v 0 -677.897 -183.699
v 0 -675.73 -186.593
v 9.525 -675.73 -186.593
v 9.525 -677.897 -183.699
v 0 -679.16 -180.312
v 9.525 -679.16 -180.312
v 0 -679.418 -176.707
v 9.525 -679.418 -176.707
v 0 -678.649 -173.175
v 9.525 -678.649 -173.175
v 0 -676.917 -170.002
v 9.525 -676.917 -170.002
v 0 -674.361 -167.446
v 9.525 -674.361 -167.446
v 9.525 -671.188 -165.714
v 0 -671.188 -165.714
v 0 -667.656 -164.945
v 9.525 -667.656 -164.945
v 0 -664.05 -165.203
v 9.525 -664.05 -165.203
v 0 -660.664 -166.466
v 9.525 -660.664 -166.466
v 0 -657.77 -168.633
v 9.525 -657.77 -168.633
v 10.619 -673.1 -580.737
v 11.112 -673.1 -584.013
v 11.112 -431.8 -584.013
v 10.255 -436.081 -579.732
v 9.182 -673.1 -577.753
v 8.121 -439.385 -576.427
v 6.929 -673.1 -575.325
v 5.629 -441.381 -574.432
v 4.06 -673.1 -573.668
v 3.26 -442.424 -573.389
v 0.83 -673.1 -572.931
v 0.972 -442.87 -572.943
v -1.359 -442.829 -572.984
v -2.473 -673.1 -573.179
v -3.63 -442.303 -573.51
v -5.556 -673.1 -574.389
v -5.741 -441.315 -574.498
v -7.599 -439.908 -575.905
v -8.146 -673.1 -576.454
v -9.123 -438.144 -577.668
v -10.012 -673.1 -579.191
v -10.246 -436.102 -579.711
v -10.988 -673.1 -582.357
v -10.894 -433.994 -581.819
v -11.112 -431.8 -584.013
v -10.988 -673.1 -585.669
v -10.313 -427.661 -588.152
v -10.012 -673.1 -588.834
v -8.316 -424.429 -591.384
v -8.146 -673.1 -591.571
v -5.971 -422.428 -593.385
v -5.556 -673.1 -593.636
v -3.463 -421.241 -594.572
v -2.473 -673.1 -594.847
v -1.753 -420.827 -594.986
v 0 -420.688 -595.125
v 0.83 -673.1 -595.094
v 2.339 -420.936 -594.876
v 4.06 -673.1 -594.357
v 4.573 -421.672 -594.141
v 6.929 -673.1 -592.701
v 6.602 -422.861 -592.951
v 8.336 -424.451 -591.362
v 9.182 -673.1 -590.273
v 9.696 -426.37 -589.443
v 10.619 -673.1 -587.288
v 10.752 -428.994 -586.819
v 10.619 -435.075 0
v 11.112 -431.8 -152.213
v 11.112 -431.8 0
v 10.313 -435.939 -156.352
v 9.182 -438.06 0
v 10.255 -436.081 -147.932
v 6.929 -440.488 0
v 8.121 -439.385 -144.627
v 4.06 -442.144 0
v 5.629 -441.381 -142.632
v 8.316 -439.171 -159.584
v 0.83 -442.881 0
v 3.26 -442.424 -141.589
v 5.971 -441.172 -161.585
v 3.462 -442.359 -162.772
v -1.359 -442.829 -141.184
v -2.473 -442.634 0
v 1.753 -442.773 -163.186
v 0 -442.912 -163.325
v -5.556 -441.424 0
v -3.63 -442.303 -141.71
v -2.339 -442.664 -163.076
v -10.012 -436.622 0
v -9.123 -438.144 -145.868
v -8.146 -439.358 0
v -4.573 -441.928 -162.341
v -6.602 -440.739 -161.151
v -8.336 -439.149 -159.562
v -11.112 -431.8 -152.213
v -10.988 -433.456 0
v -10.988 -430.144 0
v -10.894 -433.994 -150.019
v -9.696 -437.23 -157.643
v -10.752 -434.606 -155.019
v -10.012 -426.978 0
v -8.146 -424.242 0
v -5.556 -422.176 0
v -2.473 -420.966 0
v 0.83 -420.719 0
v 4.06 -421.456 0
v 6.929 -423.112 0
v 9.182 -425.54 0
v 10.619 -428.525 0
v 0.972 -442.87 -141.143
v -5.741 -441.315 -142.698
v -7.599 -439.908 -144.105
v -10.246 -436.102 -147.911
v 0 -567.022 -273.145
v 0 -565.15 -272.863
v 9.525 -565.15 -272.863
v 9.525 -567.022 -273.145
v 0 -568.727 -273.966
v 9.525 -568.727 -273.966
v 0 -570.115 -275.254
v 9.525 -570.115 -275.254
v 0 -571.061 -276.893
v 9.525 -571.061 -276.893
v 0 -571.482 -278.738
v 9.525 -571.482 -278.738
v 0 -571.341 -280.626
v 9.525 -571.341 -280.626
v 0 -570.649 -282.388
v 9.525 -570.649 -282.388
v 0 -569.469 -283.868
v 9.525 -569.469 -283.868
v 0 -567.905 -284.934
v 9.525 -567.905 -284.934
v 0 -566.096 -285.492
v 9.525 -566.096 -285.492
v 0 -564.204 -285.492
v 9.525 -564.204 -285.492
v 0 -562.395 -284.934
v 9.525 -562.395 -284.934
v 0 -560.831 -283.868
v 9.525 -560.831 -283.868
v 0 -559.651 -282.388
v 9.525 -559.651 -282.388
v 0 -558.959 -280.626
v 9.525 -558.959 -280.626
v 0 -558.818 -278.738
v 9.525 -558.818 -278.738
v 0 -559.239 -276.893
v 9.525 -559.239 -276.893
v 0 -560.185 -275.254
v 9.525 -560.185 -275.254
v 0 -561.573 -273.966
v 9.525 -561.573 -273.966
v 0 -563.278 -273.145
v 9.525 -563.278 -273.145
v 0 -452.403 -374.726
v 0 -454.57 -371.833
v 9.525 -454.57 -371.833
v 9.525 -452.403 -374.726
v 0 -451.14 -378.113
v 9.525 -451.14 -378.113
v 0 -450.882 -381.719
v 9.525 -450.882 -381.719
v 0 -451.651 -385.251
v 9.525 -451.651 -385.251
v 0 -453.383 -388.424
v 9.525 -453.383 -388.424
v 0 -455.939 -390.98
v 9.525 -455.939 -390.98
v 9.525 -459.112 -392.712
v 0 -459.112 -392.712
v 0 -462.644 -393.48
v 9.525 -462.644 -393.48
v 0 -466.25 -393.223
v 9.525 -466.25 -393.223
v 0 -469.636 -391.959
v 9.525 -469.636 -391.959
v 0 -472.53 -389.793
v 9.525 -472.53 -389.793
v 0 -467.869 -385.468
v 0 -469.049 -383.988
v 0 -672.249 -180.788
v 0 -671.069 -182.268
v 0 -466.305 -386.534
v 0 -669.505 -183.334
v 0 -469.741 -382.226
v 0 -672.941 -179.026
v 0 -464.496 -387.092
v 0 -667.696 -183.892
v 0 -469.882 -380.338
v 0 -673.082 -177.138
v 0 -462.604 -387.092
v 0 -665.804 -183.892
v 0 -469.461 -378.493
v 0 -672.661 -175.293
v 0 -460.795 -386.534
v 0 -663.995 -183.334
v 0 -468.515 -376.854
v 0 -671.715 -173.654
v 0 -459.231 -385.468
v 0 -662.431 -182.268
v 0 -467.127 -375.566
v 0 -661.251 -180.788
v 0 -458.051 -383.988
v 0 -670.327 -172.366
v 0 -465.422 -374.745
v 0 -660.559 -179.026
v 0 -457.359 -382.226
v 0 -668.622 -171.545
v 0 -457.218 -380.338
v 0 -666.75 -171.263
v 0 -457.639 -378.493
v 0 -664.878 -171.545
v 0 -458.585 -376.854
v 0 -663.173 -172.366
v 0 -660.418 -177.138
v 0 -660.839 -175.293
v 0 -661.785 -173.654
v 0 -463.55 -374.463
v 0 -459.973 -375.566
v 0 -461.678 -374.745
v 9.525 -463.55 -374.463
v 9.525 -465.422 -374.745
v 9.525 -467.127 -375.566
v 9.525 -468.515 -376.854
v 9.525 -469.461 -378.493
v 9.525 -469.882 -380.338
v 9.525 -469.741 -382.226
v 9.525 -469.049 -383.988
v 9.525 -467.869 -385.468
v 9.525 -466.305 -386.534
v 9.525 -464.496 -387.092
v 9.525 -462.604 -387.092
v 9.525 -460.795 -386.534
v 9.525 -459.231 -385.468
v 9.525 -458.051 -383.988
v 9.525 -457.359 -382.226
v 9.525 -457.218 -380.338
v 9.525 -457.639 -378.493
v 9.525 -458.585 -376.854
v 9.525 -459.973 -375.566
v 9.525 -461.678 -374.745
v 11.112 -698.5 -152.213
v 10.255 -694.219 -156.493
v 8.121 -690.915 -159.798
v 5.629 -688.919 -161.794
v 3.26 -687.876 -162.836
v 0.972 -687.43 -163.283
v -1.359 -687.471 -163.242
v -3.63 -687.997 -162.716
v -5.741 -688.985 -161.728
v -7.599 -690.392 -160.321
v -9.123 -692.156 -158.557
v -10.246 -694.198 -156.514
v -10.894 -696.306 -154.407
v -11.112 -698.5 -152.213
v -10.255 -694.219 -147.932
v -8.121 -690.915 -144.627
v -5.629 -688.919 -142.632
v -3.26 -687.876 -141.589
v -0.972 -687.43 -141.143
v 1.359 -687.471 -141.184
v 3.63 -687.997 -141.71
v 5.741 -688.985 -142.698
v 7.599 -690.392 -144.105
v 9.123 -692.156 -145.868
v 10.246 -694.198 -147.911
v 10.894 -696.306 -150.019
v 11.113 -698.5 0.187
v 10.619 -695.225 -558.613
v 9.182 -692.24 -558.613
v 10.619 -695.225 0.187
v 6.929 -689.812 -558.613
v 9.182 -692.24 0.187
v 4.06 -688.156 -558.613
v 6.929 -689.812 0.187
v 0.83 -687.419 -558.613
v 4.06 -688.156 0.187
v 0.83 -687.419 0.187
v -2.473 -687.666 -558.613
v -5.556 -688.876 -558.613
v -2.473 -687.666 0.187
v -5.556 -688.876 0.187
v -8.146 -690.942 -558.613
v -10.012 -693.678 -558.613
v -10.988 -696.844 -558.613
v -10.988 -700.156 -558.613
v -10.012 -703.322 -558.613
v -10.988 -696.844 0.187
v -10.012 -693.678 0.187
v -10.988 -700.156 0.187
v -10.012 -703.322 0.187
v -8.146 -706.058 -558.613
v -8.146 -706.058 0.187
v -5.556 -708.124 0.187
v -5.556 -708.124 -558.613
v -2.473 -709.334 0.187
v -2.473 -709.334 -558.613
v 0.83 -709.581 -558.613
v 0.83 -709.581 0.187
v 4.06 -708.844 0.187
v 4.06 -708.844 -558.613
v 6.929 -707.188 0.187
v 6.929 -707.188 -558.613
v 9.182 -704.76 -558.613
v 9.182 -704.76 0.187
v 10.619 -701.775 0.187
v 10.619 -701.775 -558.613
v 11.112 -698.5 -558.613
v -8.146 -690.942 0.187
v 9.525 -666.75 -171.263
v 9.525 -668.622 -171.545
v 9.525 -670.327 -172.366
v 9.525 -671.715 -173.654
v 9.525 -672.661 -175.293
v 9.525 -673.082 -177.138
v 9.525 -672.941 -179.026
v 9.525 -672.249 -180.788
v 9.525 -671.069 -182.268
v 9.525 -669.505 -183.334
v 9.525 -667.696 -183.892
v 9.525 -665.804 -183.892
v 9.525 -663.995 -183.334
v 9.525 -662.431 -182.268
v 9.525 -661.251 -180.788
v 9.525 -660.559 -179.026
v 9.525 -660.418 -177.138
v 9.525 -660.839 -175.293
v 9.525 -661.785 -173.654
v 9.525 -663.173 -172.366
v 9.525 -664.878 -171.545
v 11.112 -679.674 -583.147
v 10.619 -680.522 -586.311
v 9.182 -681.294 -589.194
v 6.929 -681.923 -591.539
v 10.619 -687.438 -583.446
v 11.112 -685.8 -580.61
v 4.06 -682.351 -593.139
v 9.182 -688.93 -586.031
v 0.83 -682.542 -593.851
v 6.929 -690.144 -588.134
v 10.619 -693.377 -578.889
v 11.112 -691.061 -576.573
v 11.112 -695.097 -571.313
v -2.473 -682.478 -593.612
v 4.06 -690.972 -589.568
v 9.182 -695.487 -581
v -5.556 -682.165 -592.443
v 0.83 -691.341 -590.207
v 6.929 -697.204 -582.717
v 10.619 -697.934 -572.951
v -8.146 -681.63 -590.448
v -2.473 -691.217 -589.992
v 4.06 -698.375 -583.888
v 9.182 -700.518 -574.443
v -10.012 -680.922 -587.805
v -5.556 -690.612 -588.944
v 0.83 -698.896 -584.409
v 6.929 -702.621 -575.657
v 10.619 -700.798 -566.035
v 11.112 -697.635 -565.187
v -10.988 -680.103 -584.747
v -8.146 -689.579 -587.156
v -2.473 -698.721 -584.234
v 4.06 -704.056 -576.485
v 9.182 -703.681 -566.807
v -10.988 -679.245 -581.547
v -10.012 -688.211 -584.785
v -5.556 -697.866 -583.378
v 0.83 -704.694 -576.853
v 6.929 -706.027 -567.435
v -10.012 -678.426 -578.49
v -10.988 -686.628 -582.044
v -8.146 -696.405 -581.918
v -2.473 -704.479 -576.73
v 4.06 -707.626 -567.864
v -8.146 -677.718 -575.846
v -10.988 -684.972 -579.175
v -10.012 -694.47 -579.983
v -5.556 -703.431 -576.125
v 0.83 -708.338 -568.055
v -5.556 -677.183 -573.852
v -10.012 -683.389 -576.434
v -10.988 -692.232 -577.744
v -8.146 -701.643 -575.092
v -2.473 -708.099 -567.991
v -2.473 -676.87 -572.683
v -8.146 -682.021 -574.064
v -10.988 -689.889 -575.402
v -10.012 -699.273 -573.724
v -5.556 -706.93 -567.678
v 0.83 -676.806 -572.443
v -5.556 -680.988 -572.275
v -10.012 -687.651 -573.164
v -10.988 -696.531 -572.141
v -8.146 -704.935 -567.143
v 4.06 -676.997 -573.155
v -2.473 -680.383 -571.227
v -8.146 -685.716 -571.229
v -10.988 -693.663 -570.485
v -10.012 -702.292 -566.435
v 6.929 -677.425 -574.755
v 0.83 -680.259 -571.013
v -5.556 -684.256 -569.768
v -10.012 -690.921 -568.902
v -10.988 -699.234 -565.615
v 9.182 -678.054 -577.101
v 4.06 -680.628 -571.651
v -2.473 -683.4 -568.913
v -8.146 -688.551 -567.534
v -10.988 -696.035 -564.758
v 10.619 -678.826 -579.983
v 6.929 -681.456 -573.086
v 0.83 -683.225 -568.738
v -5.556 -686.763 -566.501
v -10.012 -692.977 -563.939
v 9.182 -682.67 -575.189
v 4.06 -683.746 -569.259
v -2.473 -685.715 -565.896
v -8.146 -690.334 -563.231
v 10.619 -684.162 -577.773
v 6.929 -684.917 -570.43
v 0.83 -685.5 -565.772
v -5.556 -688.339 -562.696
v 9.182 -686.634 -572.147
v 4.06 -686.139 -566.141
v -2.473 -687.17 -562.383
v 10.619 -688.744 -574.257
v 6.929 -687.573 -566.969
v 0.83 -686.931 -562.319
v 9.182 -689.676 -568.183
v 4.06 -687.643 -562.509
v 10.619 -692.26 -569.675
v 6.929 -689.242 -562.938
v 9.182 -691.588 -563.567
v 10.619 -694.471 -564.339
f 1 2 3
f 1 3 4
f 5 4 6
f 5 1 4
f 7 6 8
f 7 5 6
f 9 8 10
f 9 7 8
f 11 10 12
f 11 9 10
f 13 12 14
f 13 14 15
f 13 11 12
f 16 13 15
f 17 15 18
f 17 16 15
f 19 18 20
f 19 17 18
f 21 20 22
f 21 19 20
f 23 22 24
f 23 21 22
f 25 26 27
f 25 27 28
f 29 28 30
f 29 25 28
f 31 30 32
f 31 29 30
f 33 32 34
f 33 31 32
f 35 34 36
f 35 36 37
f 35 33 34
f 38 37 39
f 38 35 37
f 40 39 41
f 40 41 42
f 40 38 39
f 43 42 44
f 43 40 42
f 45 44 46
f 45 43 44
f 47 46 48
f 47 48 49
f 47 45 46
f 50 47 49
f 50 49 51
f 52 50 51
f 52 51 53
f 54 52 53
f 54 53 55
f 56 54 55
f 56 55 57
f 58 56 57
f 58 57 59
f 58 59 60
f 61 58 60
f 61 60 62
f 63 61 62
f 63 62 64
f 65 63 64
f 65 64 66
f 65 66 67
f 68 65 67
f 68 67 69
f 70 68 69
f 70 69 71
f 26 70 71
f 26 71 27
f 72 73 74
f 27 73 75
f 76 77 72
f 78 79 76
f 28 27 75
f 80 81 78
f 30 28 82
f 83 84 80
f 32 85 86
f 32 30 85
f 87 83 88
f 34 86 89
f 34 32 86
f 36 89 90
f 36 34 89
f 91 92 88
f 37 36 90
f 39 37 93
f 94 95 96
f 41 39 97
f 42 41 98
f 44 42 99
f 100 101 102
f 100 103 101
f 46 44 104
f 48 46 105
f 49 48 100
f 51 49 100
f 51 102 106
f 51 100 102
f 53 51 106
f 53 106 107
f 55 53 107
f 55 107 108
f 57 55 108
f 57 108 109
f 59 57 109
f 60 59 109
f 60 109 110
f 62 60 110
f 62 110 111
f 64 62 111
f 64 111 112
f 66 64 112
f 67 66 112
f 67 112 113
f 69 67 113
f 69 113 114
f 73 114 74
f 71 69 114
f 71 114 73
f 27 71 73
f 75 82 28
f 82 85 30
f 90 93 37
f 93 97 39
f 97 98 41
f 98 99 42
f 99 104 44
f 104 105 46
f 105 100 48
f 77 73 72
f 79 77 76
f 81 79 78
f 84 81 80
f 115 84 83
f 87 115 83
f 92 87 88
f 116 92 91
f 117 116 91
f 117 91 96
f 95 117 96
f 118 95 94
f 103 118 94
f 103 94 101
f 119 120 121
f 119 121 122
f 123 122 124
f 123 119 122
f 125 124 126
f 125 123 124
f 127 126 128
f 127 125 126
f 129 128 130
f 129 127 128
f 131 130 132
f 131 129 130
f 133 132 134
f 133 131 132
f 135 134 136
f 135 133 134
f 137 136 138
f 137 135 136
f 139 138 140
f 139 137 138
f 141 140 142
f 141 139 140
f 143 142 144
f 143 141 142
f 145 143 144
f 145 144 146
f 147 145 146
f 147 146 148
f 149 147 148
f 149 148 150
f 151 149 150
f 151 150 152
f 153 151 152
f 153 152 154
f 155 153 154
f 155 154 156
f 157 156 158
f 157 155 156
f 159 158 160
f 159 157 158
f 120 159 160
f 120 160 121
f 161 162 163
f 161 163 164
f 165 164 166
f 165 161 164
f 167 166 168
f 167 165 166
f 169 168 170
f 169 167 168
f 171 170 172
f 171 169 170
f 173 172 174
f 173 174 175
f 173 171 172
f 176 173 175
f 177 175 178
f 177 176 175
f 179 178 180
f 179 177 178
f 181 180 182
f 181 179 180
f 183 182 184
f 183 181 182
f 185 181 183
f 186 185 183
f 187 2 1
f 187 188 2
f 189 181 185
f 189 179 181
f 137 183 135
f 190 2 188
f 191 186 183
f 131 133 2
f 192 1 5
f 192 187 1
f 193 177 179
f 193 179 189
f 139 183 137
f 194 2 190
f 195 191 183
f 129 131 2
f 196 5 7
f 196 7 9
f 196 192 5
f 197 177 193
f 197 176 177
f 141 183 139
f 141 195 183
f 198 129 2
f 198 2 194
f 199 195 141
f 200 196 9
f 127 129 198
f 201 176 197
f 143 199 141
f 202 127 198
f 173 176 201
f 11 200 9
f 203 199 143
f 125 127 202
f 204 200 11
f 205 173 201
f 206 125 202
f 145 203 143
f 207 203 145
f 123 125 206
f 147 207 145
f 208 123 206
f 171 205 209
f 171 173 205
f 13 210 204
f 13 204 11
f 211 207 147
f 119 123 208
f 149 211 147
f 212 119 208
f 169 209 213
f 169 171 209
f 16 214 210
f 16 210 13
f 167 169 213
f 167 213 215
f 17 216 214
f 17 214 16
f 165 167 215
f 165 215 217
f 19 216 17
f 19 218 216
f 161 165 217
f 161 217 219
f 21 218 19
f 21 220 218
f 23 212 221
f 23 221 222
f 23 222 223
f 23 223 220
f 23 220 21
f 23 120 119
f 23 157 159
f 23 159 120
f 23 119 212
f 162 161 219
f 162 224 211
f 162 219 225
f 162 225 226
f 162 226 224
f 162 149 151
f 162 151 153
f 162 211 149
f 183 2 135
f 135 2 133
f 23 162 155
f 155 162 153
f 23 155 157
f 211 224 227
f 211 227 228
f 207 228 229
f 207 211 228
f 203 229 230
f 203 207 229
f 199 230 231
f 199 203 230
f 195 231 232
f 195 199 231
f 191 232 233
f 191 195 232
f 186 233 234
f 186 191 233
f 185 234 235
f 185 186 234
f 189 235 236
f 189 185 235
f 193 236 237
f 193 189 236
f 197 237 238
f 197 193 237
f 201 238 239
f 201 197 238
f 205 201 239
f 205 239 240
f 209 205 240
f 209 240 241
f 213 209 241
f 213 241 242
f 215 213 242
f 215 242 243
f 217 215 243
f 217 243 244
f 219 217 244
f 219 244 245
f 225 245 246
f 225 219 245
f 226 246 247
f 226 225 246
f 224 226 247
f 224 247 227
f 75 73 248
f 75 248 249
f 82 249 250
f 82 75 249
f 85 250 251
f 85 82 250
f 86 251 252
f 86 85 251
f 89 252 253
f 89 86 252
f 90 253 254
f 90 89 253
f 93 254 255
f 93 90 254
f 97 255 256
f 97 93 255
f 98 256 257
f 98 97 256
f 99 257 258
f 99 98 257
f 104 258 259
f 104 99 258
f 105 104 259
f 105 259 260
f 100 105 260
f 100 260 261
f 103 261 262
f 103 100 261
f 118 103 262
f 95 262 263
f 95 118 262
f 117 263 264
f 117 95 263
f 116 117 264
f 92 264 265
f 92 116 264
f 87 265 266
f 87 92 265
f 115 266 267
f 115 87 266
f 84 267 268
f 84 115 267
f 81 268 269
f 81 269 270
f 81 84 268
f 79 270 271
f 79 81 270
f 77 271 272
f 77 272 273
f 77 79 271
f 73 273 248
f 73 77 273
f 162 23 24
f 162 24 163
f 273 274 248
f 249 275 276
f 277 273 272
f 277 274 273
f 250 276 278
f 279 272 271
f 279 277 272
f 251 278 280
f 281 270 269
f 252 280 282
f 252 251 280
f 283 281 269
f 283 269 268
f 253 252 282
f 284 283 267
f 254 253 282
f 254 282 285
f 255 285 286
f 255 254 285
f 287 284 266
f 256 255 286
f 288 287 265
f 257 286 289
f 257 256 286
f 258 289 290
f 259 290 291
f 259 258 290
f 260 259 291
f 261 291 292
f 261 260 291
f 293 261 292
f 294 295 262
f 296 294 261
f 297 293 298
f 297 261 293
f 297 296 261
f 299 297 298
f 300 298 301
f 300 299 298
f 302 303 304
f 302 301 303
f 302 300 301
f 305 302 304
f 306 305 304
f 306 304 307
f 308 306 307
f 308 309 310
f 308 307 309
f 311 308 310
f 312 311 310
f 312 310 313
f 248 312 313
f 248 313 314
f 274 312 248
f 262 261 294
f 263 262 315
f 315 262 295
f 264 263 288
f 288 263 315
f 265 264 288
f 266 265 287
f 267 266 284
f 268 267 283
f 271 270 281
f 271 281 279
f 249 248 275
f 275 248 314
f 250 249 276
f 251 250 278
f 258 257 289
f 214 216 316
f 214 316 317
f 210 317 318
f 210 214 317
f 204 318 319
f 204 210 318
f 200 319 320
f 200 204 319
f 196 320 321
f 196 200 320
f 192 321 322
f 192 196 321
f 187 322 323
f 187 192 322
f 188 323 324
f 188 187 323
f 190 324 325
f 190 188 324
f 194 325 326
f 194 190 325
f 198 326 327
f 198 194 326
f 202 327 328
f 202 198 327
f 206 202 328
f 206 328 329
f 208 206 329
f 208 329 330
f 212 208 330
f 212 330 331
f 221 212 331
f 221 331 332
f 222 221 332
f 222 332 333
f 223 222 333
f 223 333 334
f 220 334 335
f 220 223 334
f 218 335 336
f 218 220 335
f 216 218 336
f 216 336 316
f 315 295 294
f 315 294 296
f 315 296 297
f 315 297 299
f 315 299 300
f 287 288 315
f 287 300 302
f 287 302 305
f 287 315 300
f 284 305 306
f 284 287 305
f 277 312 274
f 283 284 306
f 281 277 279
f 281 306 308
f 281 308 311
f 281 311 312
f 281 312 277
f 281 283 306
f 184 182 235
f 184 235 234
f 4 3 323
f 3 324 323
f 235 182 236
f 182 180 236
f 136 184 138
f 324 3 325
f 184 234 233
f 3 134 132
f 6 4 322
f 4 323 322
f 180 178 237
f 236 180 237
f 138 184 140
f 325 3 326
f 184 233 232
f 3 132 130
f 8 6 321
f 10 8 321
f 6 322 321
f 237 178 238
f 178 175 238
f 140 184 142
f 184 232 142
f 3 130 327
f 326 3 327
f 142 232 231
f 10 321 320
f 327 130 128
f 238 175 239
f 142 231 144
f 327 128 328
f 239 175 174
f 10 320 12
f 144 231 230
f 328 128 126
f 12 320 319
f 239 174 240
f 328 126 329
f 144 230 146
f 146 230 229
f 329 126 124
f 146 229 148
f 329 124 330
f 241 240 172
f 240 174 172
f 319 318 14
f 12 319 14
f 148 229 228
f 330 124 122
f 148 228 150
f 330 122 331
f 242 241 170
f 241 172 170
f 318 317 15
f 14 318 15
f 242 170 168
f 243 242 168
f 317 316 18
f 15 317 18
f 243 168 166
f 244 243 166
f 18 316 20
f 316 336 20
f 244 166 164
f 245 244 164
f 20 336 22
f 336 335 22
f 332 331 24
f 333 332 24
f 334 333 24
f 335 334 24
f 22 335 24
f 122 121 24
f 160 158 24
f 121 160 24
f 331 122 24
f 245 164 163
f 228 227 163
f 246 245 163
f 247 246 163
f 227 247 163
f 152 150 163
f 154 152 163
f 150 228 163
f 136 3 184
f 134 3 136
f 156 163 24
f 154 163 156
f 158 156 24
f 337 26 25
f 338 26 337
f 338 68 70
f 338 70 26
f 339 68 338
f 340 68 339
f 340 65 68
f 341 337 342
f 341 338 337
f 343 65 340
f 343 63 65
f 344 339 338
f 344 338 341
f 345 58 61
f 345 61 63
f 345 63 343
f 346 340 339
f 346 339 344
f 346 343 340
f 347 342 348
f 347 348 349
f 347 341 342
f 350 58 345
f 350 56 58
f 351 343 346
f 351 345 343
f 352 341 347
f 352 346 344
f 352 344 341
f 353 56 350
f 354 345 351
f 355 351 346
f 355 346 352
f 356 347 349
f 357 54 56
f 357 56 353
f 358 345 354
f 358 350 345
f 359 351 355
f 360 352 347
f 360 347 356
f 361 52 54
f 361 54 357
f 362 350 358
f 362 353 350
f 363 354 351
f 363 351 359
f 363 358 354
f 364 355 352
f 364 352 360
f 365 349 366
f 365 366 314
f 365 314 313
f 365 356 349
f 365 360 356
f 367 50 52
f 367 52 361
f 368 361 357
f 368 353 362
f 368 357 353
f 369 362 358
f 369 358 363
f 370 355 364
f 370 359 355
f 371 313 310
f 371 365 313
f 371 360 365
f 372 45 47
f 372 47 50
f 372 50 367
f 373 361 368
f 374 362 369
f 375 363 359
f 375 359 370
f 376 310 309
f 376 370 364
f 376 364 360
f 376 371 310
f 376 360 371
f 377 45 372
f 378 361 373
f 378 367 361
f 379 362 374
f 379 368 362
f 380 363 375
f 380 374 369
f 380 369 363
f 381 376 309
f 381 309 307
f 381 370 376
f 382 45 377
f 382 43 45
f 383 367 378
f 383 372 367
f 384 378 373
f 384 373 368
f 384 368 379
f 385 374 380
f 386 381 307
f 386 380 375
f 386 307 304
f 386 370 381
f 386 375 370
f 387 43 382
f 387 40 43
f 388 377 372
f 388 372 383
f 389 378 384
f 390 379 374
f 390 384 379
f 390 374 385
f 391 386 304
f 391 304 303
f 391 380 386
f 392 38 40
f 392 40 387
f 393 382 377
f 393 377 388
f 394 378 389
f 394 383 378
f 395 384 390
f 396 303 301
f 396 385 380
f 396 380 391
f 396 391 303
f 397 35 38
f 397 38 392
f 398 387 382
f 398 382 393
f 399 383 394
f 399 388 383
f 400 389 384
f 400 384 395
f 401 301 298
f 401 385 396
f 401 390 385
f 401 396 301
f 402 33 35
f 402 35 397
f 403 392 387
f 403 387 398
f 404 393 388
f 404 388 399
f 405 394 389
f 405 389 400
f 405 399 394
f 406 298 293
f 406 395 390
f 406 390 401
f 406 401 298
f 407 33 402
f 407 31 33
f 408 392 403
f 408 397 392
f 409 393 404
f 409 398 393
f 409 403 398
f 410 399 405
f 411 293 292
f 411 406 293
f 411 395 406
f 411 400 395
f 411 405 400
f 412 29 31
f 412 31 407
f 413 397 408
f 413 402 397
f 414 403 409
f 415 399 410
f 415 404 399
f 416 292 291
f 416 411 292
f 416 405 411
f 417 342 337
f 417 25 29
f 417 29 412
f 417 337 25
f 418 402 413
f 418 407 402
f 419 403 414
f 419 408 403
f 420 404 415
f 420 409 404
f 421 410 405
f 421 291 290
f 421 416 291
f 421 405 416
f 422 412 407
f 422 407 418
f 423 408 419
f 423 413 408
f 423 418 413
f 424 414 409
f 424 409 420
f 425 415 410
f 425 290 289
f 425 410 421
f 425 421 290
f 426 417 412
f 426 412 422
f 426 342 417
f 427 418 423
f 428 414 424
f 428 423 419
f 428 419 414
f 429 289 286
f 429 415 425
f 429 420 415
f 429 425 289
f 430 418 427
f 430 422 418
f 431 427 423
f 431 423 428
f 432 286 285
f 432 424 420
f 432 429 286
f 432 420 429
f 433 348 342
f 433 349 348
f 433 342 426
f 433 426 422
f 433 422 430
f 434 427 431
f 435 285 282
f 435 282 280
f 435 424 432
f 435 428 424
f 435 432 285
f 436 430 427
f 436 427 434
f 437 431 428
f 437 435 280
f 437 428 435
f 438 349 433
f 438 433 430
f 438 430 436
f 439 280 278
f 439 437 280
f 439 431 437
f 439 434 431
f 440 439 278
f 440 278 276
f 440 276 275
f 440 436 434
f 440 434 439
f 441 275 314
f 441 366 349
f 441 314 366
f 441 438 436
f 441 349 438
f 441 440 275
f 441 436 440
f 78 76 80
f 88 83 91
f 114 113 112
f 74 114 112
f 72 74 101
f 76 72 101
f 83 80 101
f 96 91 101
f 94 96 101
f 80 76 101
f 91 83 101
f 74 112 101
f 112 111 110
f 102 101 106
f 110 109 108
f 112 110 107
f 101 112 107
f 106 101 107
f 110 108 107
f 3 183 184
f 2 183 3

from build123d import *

# Parameters (mm, degrees)
SKETCH3_R           = 11.1125
SKETCH3_8_R         = 11.1125
SKETCH11_R          = 6.35
BOSS_EXTRUDE1_DEPTH = 9.525


with BuildPart() as part:
    # Sweep1: sweep along a path in Sketch1
    with BuildLine(Plane(origin=(0, 0, 0), x_dir=(0, 0, -1), z_dir=(1, 0, 0))) as sweep1_path:
        Line((0, -431.8), (152.212779539, -431.8))
        Line((152.212779539, -431.8), (584.012779539, -431.8))
        Line((584.012779539, -431.8), (584.012779539, -673.1))
        ThreePointArc((584.012779539, -673.1), (576.573291781, -691.060512242), (558.612779539, -698.5))
        Line((558.612779539, -698.5), (152.212779539, -698.5))
        Line((152.212779539, -698.5), (-0.187220461, -698.5))
    # Sketch3 → Sweep1 (sweep)
    with BuildSketch(Plane.XY):
        with Locations((0, -698.5)):
            Circle(SKETCH3_R)
    sweep(path=sweep1_path.line, transition=Transition.RIGHT)

    # Sweep2: sweep along a path in Sketch1<23>
    with BuildLine(Plane(origin=(0, 0, 0), x_dir=(0, 0, -1), z_dir=(1, 0, 0))) as sweep2_path:
        Line((-0.187220461, -698.5), (152.212779539, -698.5))
        Line((152.212779539, -698.5), (152.212779539, -431.8))
    # Sketch3<8> → Sweep2 (sweep)
    with BuildSketch(Plane.XY):
        with Locations((0, -698.5)):
            Circle(SKETCH3_8_R)
    sweep(path=sweep2_path.line, transition=Transition.RIGHT)


with BuildPart() as body_2:
    # Sketch11 → Boss-Extrude1 (new body)
    with BuildSketch(Plane(origin=(0, 0, 0), x_dir=(0, 0, -1), z_dir=(1, 0, 0))):
        with BuildLine():
            Line((389.79303566, -472.530256121), (186.59303566, -675.730256121))
            ThreePointArc((186.59303566, -675.730256121), (168.632523418, -675.730256121), (168.632523418, -657.769743879))
            Line((168.632523418, -657.769743879), (371.832523418, -454.569743879))
            ThreePointArc((371.832523418, -454.569743879), (389.79303566, -454.569743879), (389.79303566, -472.530256121))
        make_face()
        with Locations((177.612779539, -666.75)):
            Circle(SKETCH11_R, mode=Mode.SUBTRACT)
        with Locations((279.212779539, -565.15)):
            Circle(SKETCH11_R, mode=Mode.SUBTRACT)
        with Locations((380.812779539, -463.55)):
            Circle(SKETCH11_R, mode=Mode.SUBTRACT)
    extrude(amount=BOSS_EXTRUDE1_DEPTH)


solid = Compound([part.part, body_2.part])
